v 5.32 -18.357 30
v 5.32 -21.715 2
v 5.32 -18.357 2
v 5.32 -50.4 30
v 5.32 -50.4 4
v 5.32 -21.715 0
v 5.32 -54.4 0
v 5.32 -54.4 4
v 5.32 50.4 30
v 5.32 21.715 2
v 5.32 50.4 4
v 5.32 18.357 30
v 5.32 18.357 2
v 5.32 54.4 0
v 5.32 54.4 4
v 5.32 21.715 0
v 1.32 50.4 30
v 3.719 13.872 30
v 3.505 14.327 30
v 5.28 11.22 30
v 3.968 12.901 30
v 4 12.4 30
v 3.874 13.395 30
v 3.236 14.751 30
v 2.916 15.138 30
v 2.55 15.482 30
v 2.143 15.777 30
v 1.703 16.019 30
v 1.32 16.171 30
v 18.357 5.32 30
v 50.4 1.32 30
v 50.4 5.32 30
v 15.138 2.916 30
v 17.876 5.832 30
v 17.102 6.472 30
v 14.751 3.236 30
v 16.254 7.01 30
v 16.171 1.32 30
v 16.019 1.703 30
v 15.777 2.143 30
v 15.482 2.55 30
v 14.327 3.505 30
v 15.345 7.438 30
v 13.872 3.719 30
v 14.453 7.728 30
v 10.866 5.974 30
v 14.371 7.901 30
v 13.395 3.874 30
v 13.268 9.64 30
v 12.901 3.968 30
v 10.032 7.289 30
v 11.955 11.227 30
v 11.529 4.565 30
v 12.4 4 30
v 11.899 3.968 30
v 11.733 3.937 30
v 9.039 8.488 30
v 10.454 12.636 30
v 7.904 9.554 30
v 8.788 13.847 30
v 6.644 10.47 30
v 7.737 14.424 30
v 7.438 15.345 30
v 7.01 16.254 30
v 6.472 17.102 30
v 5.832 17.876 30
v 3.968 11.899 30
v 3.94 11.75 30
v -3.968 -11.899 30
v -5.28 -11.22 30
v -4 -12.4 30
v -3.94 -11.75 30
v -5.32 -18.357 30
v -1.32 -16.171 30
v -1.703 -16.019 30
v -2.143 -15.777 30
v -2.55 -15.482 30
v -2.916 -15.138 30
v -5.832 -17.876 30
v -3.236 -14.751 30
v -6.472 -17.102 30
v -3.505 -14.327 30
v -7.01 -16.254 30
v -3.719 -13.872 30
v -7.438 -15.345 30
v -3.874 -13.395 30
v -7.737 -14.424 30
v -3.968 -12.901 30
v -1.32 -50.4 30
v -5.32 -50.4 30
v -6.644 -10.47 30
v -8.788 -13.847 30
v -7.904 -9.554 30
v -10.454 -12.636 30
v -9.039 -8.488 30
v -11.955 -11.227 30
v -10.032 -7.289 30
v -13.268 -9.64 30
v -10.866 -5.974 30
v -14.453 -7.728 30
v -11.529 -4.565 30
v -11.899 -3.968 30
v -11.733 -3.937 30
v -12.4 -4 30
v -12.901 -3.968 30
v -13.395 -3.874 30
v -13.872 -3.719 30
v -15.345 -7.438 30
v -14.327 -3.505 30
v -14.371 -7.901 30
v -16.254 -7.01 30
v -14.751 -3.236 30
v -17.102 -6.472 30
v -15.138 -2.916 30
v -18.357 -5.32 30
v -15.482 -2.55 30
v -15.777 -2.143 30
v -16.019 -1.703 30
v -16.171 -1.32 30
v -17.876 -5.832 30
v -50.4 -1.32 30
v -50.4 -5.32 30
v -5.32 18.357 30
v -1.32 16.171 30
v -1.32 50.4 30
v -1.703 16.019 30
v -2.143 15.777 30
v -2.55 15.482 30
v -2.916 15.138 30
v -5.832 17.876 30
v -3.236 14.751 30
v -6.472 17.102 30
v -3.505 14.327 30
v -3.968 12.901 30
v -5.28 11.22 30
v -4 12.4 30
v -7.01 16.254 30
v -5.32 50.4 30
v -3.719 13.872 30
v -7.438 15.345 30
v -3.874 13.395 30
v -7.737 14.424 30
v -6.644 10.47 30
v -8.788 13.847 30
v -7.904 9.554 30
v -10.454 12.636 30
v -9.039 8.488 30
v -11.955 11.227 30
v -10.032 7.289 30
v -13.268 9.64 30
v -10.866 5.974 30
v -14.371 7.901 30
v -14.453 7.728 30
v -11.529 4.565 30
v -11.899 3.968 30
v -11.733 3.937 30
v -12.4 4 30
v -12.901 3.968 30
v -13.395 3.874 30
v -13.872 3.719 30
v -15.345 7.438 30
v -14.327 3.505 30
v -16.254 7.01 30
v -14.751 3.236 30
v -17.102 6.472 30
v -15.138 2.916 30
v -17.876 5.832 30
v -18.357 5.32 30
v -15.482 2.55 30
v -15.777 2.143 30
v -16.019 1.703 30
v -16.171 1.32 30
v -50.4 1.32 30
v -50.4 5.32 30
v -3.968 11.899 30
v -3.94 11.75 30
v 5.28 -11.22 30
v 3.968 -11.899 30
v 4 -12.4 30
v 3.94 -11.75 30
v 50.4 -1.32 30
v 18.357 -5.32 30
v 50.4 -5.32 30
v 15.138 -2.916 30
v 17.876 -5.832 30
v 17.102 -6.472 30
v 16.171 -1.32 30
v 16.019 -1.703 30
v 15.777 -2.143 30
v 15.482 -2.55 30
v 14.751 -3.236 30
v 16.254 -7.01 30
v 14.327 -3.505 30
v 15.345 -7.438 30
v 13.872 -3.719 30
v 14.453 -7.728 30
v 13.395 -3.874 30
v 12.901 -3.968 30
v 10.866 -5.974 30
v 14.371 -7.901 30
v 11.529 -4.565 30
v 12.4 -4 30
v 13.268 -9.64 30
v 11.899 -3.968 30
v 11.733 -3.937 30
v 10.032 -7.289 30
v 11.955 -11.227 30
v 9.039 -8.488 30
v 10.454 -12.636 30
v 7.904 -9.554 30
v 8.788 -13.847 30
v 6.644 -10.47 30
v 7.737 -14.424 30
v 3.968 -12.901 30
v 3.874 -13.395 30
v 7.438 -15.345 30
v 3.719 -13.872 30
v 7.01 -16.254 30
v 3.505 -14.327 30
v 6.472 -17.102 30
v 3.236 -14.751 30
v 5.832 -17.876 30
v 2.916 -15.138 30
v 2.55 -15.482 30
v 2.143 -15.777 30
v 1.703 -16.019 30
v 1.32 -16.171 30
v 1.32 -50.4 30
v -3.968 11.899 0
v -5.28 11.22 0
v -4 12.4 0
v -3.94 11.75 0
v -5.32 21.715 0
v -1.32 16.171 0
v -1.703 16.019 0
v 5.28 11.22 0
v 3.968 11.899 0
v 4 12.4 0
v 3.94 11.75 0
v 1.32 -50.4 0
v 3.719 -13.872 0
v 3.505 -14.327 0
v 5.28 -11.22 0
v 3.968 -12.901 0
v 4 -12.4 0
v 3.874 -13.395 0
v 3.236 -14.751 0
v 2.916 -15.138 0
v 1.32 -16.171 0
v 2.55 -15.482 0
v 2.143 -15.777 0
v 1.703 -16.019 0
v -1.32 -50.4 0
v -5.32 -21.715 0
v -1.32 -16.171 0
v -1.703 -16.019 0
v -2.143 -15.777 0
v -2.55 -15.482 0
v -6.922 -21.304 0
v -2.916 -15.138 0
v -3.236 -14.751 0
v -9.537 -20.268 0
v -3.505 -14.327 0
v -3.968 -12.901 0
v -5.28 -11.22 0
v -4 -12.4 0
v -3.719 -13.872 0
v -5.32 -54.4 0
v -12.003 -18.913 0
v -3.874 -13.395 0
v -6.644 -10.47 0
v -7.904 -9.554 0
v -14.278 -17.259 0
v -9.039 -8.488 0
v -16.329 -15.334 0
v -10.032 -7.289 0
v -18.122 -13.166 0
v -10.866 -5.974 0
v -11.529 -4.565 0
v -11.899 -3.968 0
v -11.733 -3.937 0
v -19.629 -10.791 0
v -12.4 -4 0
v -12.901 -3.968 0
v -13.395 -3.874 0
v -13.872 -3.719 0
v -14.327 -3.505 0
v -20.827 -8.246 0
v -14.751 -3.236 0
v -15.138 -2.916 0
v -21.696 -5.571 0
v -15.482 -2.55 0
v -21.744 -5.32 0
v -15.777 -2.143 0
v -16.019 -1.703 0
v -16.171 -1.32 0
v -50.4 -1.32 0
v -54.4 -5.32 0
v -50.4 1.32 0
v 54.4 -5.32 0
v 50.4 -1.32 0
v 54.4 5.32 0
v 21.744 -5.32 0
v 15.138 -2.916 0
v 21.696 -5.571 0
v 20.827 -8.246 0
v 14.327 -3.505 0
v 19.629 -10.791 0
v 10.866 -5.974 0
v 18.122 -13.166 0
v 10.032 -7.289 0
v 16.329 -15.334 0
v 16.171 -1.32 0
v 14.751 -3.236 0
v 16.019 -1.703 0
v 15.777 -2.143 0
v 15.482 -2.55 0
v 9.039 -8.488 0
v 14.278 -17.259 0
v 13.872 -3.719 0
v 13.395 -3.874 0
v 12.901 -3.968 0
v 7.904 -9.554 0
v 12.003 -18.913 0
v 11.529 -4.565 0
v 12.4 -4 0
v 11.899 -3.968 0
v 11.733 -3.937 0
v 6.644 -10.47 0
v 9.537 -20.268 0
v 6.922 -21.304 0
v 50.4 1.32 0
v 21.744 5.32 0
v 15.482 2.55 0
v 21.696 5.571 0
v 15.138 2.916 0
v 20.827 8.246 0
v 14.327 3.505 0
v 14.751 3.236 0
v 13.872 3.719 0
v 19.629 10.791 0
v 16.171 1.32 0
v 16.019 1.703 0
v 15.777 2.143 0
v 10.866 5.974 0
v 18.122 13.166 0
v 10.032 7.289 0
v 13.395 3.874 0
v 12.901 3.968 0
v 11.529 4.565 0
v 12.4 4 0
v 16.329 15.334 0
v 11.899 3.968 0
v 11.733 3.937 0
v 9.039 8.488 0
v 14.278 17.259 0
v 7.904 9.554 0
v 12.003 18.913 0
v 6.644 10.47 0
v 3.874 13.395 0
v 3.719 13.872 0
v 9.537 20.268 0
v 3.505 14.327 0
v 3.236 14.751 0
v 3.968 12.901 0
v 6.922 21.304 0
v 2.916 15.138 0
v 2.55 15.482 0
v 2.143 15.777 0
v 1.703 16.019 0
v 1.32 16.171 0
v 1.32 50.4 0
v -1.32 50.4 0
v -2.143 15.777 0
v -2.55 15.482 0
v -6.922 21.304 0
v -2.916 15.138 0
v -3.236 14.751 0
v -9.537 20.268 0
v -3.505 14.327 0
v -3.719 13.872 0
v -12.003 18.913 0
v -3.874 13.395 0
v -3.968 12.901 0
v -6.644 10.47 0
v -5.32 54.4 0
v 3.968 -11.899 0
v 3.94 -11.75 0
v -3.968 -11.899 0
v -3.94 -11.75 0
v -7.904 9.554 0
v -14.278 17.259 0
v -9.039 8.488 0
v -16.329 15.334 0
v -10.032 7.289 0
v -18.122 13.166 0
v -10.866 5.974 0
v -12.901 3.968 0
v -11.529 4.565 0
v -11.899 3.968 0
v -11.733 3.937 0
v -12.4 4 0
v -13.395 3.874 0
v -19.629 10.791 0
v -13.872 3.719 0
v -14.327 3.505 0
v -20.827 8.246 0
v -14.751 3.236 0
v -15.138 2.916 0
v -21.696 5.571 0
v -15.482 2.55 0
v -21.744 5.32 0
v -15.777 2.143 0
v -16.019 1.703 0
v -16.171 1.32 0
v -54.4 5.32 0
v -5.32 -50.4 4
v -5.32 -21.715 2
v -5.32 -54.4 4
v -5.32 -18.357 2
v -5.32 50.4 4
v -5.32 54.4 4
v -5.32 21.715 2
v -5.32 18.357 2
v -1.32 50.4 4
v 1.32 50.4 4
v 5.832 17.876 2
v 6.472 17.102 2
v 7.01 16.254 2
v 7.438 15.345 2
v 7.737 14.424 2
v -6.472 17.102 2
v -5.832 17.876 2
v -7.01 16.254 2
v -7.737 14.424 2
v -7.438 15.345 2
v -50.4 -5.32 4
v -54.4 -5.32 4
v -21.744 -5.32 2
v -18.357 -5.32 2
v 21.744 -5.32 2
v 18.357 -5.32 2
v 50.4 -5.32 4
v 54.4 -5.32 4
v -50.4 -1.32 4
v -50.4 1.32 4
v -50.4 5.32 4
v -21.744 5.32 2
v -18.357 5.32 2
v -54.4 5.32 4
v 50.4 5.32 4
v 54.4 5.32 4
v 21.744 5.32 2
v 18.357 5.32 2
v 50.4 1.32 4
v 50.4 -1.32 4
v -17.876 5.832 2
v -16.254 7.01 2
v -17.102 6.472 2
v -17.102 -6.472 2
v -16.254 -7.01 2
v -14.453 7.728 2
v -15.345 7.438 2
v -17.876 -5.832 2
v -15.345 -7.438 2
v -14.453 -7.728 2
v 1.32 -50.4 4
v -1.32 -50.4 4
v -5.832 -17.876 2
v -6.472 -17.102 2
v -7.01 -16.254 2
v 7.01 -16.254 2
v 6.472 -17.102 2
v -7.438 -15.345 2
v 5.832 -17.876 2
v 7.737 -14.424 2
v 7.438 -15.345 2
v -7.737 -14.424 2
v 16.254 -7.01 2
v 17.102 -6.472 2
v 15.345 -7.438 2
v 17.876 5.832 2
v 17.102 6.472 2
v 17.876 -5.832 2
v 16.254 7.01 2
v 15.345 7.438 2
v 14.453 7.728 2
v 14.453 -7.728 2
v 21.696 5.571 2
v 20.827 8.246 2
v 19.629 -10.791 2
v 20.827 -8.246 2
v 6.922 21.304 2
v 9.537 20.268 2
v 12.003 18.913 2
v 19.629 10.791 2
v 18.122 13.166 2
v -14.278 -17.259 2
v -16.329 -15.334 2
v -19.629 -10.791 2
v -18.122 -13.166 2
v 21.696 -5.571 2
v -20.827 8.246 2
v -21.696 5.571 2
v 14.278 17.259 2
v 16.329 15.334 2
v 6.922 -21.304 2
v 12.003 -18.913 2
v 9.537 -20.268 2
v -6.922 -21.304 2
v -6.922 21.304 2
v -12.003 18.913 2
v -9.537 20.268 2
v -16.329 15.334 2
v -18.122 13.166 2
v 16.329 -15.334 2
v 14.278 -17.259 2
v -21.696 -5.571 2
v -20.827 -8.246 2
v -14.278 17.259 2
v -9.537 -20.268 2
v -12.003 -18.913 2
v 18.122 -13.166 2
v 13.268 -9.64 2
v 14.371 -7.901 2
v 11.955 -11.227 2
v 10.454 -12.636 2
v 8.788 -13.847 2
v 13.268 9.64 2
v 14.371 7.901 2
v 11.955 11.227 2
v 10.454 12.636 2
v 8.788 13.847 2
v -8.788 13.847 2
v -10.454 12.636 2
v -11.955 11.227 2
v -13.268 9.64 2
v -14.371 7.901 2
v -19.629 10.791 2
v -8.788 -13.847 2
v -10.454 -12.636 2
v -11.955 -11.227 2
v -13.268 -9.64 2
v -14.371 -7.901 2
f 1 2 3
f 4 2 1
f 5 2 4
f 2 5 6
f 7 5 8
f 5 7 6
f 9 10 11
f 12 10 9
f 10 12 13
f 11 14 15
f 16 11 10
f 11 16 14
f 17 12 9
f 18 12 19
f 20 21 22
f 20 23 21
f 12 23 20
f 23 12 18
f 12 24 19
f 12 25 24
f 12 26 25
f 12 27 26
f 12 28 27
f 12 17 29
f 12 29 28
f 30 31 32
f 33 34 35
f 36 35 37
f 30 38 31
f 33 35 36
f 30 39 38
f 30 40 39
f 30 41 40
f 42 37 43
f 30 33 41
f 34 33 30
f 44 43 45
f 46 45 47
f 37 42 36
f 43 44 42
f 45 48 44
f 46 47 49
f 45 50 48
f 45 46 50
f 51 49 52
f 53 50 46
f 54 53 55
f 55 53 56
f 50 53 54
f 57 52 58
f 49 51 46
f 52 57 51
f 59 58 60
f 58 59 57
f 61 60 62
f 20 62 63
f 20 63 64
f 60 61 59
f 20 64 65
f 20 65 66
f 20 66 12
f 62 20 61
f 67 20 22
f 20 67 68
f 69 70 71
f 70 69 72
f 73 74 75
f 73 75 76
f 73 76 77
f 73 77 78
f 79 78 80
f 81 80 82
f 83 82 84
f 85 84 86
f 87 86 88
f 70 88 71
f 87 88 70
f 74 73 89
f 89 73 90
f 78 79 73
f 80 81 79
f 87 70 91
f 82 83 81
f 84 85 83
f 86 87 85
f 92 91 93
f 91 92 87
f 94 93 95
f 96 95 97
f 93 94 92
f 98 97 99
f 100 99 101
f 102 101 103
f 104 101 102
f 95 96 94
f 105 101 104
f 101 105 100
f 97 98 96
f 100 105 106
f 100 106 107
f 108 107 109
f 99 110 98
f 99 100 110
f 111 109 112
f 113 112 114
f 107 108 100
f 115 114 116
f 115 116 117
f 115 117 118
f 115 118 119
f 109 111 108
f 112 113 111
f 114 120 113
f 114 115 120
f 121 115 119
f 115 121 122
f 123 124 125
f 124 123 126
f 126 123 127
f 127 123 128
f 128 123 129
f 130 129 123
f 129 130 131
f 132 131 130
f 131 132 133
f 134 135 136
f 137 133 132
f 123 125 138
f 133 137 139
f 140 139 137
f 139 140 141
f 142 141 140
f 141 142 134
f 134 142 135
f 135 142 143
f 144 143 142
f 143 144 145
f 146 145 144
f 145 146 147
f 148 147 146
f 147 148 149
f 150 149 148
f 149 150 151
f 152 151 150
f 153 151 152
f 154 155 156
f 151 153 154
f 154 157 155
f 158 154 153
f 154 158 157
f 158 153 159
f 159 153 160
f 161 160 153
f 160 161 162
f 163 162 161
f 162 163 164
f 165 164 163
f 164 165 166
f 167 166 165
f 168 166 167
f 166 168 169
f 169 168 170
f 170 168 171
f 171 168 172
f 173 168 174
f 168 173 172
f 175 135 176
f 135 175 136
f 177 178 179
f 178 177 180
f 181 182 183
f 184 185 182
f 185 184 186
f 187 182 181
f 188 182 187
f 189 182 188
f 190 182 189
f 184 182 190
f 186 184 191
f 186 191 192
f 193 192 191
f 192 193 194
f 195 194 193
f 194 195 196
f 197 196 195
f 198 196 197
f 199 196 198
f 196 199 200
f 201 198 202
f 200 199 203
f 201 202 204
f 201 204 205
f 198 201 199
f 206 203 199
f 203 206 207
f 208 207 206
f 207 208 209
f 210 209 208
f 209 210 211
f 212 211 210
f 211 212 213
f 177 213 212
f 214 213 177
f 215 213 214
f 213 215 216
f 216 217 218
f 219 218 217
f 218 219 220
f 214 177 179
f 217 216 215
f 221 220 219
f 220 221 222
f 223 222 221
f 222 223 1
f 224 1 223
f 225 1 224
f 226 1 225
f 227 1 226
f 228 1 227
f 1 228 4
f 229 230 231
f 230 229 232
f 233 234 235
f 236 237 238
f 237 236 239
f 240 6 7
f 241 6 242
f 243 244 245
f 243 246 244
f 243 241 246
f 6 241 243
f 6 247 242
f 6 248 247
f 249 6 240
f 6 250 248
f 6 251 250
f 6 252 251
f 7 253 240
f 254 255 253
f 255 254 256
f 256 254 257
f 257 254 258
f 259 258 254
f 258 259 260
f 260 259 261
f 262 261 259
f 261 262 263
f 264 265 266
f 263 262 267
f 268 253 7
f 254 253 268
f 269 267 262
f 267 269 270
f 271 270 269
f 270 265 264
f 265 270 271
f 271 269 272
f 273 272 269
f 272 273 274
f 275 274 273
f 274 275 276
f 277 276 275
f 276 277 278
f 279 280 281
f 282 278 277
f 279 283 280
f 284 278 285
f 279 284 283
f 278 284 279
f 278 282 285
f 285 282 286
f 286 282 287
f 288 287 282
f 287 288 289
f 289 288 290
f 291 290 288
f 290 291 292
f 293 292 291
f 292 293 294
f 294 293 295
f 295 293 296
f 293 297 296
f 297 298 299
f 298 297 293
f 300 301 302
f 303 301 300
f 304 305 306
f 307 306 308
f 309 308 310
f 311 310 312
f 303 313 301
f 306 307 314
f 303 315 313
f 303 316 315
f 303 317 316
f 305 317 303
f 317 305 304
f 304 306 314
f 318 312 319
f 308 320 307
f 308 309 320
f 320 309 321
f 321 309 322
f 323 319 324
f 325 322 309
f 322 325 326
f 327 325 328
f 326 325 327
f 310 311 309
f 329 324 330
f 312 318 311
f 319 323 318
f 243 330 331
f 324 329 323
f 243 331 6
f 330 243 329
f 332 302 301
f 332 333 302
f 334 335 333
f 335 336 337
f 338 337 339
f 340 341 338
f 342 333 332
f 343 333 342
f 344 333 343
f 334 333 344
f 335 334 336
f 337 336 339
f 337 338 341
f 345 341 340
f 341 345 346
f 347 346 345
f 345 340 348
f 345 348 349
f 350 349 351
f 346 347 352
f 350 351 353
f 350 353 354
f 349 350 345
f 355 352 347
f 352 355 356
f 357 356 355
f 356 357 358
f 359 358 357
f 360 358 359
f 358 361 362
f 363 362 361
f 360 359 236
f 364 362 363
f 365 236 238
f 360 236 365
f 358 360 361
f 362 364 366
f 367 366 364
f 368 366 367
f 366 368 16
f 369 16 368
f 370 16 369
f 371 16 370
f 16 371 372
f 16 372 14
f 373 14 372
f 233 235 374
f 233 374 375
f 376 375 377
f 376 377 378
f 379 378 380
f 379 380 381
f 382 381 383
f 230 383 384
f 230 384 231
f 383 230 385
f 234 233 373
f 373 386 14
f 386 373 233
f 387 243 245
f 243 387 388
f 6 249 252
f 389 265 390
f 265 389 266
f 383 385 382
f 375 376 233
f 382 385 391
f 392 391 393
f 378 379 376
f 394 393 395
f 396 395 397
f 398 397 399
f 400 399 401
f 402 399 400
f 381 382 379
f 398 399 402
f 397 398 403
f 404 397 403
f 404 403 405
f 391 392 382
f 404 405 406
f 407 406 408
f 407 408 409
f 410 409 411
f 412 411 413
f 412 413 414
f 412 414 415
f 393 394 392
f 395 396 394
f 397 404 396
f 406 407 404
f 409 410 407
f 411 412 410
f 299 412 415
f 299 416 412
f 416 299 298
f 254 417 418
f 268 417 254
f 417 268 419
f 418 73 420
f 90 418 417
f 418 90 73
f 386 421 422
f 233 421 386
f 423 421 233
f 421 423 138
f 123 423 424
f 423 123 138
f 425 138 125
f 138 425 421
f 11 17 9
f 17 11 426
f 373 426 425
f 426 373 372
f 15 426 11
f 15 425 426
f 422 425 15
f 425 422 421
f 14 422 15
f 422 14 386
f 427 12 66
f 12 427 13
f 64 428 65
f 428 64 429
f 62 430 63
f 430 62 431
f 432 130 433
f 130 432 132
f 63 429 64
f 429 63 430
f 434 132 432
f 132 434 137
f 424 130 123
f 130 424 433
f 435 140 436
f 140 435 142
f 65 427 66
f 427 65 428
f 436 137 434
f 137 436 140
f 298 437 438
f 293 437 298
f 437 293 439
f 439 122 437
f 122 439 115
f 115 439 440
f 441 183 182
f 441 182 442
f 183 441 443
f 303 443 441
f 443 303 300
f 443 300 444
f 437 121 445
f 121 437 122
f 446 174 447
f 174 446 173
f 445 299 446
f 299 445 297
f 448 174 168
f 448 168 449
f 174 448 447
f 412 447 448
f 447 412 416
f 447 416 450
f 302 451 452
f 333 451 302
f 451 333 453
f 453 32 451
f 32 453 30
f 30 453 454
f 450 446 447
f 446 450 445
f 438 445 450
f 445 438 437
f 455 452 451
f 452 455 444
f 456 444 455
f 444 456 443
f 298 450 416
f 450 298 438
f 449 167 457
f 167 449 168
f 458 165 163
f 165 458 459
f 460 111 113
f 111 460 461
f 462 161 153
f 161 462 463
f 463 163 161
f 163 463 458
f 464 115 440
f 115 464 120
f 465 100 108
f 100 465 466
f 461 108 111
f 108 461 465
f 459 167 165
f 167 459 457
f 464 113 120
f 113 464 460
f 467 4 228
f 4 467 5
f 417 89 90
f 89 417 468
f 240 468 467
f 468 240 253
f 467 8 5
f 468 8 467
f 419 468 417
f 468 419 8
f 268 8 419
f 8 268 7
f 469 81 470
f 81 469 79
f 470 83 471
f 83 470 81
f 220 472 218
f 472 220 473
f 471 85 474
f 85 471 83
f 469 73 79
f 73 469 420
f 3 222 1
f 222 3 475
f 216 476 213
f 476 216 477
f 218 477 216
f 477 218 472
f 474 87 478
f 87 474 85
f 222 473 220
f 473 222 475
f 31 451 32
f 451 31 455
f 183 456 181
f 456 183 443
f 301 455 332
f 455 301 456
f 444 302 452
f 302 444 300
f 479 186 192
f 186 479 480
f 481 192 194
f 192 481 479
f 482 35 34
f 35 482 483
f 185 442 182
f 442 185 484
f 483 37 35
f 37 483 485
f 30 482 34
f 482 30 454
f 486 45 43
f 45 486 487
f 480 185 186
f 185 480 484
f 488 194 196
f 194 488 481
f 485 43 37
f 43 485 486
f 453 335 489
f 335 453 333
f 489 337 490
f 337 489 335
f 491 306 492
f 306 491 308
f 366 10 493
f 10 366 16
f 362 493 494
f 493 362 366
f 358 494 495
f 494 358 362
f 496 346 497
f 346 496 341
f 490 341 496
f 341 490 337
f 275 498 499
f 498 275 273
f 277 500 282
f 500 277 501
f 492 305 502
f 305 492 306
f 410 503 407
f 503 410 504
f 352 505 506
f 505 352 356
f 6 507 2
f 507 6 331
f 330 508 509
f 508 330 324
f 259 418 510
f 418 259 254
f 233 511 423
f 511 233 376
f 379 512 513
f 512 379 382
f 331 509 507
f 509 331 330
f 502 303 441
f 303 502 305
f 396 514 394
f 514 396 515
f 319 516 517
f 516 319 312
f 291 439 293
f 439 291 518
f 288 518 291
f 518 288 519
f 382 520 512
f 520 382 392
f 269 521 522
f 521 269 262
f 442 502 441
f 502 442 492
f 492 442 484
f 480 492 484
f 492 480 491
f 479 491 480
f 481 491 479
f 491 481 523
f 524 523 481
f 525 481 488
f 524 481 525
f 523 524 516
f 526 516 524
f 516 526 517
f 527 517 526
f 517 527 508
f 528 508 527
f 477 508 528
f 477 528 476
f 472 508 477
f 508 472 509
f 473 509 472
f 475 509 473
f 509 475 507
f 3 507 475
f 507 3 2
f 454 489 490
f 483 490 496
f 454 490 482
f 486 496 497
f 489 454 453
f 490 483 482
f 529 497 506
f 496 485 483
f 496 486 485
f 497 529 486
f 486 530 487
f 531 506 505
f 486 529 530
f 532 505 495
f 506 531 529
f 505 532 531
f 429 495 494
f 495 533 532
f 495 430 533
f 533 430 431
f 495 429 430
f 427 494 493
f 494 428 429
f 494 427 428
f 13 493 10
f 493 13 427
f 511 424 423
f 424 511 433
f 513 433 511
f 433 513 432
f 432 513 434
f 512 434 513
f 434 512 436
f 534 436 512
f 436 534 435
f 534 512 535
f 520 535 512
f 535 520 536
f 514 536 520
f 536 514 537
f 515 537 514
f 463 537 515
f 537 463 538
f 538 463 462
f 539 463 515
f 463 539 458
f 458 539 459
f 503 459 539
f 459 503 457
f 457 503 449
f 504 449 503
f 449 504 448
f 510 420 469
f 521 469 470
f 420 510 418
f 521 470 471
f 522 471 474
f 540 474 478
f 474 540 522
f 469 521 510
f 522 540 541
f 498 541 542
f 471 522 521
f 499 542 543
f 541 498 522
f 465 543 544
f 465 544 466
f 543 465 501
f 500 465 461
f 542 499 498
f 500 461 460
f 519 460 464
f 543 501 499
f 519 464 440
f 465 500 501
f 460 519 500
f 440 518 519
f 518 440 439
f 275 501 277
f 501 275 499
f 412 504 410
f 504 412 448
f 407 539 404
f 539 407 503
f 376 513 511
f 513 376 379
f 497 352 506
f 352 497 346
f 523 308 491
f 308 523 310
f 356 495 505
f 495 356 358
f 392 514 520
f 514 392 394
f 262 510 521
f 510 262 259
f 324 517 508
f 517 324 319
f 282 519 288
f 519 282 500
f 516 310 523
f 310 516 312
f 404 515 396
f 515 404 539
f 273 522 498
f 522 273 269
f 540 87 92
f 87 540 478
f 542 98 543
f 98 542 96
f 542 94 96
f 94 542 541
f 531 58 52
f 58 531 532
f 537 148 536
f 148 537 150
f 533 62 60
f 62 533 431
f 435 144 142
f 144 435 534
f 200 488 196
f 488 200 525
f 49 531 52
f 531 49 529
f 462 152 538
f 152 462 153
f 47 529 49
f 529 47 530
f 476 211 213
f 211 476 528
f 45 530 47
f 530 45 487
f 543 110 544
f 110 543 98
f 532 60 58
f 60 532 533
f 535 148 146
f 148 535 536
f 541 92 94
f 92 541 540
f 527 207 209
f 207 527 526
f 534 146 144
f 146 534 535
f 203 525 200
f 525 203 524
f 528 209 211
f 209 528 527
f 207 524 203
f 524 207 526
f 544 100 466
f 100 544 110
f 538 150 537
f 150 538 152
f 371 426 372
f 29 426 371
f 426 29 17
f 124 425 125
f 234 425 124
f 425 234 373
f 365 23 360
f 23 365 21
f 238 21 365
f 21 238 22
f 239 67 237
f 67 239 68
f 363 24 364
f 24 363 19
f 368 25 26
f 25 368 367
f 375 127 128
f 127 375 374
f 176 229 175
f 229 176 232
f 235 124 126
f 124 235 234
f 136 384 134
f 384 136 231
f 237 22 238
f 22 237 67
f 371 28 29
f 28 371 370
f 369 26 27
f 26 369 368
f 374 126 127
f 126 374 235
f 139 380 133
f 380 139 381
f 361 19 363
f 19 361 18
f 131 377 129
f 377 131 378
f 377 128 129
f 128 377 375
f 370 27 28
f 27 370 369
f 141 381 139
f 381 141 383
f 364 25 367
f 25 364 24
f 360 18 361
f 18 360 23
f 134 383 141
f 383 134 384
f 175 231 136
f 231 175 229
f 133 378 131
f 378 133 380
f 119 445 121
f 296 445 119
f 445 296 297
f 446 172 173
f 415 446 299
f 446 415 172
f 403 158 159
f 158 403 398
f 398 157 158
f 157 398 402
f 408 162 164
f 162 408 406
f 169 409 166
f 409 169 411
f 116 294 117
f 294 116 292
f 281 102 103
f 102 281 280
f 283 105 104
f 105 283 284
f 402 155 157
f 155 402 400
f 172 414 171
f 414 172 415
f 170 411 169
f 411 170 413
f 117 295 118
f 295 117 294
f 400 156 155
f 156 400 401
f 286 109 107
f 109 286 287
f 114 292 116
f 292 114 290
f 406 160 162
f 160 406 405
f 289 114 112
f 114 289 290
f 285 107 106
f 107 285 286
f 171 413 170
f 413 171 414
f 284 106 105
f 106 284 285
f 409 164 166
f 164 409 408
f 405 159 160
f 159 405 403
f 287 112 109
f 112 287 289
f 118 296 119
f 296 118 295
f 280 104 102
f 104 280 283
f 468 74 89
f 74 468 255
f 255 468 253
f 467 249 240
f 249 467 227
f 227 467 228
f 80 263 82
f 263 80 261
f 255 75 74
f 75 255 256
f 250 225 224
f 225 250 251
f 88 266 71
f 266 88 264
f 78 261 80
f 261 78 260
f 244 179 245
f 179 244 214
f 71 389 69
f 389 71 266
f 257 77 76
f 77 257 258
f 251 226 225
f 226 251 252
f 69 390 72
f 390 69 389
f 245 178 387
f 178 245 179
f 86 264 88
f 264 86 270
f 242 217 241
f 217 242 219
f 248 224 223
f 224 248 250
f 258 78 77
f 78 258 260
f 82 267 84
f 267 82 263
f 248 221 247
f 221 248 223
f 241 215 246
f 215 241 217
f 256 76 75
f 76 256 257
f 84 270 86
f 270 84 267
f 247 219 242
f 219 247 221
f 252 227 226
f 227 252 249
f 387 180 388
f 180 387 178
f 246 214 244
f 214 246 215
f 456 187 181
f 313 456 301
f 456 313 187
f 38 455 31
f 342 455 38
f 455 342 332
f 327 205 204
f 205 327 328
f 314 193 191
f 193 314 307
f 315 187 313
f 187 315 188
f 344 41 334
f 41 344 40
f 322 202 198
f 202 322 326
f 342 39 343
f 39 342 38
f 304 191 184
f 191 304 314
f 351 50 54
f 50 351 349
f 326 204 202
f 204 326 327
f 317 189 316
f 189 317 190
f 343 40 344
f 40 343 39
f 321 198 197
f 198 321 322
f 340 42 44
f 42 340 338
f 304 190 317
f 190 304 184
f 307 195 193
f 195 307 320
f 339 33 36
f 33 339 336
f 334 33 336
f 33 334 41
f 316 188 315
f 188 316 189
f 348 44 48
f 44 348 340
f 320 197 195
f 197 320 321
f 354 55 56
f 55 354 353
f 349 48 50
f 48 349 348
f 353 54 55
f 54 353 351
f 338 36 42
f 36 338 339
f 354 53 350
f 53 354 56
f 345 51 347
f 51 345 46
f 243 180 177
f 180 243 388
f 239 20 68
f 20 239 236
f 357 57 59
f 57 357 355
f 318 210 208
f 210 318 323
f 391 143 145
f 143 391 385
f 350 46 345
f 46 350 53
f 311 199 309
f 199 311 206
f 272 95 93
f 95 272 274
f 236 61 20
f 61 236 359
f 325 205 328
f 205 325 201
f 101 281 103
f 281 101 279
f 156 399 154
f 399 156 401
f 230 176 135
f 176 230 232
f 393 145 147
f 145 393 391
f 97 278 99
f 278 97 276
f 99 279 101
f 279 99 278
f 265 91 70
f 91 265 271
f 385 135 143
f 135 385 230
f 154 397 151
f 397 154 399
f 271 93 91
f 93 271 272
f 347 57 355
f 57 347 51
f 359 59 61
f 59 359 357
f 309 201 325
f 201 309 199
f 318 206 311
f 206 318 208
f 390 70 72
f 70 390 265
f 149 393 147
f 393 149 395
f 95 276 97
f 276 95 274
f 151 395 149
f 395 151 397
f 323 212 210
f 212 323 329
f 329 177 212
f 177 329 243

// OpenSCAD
//            *********************************************
//            *  Fin Alignment Tools for Model Rockets    *
//            *  Blair Thompson (aka Justblair)           *
//            *  www.justblair.co.uk                      *
//            *  modified by Doug Cullen aka dcullen      *
//            *  15 Apr 2016                              *
//            *********************************************
 
 
// Parametric
tube_diameter  = 24.8  ;// mm measured tube outer diameter
flange_thickness = 2   ;// mm thickness of lower flange around tube
fin_width      =  2.64 ;// mm measured fin width
fin_number     =  4    ;// Number of fins
jig_height     = 30    ;// mm height of jig
jig_fin_width  = 38    ;// mm Fin span
wall_thickness =  4    ;// mm desired wall thickness
glue_clearance =  4    ;// mm inner gap to prevent glue sticking to jig
$fn            =50    ; // Changes the smoothness of the curves
  
difference(){
  // Create the solid shapes
       union(){
         cylinder (r = (tube_diameter/2) + 10, h = flange_thickness);
         cylinder (r = (tube_diameter/2) + wall_thickness, h =jig_height);
            for (i = [0:fin_number - 1]){
// Fin holders
     rotate( i * 360 / fin_number, [0, 0, 1])
     translate (-[(fin_width + wall_thickness * 2) / 2, 0, 0])
     cube([fin_width + wall_thickness * 2, jig_fin_width + tube_diameter/2,jig_height]);
                                               
// End Ties
     rotate( i * 360 / fin_number, [0, 0, 1])
     translate ([-(fin_width + wall_thickness * 2) / 2, 0, 0])
     cube([fin_width + wall_thickness * 2, jig_fin_width + tube_diameter/2 + wall_thickness, 4]);
                                                                               
// Inner gap       
    rotate( i * 360 / fin_number, [0, 0, 1])
    translate ([0, tube_diameter/2, 0])
    cylinder (r = glue_clearance + wall_thickness, h =jig_height);
              }
     }
               
// Create the cutout shapes
               
// Rocket tube body
      translate ([0,0,-0.5])
      cylinder (r=tube_diameter/2, h = jig_height + 1);
           for (i = [0:fin_number - 1]){
               
// Fin cutouts
     rotate( i * 360 / fin_number, [0, 0, 1])
     translate ([-fin_width/2, 0, -0.5])
     cube([fin_width, jig_fin_width + tube_diameter/2, jig_height + 1]);
                                                               
// Inner gap                       
     rotate( i * 360 / fin_number, [0, 0, 1])
     translate ([0, tube_diameter/2, -0.5])
     cylinder (r = glue_clearance, h = jig_height + 1);
           }
   }
 
